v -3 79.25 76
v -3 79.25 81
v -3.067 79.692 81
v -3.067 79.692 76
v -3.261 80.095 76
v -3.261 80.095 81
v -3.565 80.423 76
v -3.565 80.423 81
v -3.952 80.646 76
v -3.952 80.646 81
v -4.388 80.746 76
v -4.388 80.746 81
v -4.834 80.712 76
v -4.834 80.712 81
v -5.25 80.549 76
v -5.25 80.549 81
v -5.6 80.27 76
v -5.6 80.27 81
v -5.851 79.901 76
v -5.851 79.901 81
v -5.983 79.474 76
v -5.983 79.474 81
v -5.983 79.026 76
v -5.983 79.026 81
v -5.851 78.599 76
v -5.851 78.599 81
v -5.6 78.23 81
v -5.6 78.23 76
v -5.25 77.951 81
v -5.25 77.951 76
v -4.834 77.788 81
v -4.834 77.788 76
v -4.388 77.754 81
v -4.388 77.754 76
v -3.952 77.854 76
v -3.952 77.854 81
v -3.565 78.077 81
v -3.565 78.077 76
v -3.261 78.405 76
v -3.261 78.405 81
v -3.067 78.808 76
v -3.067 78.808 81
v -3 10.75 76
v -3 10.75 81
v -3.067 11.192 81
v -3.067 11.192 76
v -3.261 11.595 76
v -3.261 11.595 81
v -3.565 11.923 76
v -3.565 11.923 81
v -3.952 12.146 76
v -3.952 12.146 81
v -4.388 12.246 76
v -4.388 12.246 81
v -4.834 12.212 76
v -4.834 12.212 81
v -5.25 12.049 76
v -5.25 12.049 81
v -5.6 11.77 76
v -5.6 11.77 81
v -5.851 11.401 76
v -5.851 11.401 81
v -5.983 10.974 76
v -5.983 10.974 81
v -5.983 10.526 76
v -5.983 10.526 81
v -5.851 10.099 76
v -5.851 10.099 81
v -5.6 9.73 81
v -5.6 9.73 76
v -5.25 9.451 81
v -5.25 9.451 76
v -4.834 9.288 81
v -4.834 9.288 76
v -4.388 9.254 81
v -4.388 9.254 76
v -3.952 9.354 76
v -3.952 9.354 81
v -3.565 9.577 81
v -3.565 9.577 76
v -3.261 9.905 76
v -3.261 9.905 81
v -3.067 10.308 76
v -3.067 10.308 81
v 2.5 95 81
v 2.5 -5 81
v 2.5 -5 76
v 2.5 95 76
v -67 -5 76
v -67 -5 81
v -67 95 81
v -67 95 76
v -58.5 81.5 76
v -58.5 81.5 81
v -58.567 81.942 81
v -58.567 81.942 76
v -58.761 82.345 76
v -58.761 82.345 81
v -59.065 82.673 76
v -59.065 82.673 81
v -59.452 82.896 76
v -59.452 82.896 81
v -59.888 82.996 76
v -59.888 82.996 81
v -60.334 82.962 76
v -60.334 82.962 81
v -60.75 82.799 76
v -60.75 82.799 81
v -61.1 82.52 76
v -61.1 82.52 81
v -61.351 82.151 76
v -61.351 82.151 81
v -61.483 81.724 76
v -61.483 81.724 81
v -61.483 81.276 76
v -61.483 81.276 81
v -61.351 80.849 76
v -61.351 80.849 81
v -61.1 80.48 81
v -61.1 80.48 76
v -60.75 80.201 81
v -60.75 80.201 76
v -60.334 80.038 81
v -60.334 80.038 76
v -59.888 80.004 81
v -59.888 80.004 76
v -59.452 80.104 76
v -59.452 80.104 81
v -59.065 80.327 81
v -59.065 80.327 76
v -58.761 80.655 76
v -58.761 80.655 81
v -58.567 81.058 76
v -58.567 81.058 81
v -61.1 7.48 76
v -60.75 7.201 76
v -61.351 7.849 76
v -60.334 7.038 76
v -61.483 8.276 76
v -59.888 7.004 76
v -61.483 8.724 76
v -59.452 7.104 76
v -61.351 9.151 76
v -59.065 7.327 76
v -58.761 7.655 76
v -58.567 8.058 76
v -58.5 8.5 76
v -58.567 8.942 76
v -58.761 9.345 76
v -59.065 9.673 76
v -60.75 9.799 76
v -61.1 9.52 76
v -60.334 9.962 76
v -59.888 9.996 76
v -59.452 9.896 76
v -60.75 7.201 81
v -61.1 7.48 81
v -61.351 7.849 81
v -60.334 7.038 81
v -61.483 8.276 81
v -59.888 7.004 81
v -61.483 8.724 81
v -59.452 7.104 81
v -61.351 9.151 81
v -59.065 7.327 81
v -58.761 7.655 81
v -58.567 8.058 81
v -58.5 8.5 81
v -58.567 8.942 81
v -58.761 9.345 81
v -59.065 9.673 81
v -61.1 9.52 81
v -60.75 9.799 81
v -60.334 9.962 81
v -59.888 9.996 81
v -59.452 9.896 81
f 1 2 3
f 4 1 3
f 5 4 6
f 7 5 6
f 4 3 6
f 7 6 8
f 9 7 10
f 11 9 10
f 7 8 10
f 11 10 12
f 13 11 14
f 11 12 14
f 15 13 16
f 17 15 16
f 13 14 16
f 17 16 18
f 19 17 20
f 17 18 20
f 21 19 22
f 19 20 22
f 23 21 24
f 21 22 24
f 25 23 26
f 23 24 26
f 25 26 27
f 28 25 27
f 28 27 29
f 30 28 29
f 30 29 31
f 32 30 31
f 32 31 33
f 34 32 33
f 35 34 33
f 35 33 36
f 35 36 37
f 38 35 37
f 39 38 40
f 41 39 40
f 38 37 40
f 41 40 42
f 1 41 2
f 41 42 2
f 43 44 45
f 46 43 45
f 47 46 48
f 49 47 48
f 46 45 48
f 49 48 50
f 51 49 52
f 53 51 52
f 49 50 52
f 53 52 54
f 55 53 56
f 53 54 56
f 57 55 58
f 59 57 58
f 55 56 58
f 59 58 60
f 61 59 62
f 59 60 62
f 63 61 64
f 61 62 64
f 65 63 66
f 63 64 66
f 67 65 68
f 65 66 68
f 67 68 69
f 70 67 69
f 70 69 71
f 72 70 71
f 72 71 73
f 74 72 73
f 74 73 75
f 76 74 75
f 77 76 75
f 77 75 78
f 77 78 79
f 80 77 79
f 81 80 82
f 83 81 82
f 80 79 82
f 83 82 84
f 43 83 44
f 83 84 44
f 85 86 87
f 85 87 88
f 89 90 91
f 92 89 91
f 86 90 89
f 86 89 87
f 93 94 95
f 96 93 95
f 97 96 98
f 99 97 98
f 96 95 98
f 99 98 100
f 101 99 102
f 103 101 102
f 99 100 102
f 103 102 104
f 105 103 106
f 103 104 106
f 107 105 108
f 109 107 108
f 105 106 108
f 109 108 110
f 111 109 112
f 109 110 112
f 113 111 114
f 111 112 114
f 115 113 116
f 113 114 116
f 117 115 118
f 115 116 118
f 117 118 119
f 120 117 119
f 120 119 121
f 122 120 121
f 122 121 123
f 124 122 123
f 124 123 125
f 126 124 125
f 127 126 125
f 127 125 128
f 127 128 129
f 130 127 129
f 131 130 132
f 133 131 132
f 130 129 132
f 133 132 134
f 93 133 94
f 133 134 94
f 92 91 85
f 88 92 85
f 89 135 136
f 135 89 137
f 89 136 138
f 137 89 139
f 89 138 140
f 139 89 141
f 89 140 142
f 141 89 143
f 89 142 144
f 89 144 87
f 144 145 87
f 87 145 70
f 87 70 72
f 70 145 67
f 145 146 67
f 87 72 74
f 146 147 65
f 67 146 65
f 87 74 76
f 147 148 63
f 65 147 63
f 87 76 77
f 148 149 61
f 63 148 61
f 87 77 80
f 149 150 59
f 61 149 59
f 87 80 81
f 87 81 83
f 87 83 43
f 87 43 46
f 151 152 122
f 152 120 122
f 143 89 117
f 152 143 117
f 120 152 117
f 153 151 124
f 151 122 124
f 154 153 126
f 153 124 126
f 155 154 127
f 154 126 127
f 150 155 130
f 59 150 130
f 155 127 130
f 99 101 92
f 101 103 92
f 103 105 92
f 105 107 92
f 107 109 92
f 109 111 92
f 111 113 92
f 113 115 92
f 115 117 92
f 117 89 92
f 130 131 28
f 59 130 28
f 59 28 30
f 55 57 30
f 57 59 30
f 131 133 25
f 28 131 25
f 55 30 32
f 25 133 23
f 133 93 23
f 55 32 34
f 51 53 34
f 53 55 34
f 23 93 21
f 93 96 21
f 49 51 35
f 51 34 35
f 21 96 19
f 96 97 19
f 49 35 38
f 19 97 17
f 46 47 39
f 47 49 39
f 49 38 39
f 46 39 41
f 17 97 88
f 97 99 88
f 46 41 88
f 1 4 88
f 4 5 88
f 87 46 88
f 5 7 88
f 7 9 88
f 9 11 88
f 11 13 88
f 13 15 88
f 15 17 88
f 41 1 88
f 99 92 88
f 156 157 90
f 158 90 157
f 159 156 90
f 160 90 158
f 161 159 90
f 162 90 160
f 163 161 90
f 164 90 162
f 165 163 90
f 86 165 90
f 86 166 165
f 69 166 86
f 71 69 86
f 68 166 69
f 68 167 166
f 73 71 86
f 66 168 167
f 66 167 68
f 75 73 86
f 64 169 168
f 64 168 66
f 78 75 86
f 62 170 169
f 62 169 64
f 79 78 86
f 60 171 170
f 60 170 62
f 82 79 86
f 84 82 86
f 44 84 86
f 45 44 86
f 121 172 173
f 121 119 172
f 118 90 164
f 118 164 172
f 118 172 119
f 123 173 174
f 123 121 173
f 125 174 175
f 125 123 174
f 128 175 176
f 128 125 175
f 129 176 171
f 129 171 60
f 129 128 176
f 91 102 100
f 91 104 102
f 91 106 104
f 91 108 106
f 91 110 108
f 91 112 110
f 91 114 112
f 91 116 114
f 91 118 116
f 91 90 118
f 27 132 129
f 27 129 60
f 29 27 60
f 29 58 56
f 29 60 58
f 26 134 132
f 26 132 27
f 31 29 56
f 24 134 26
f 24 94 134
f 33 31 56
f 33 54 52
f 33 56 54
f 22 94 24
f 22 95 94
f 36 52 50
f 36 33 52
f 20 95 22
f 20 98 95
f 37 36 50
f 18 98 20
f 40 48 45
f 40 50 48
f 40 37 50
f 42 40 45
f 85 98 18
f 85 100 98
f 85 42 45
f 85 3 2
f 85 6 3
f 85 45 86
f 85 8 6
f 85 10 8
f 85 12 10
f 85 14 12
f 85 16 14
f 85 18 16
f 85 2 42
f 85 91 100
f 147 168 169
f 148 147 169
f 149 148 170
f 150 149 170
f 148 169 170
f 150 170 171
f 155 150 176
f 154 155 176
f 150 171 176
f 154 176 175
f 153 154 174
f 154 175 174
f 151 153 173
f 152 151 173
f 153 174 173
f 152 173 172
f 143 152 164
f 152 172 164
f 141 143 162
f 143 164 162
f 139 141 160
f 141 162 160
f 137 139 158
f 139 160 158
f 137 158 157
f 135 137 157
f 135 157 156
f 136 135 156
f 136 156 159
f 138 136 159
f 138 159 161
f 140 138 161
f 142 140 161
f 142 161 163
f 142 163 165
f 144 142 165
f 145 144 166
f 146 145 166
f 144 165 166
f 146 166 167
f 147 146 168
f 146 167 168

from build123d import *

# Parameters (mm, degrees)
SKETCH_1_W      = 69.5
SKETCH_1_H      = 100
SKETCH_1_R      = 1.5
EXTRUDE_1_DEPTH = 5


with BuildPart() as part:
    # Эскиз1 → Бобышка-Вытянуть1 (new body)
    with BuildSketch(Plane.XY.offset(81)):
        with Locations((-32.25, 45)):
            Rectangle(SKETCH_1_W, SKETCH_1_H)
        with Locations((-60, 8.5)):
            Circle(SKETCH_1_R, mode=Mode.SUBTRACT)
        with Locations((-60, 81.5)):
            Circle(SKETCH_1_R, mode=Mode.SUBTRACT)
        with Locations((-4.5, 79.25)):
            Circle(SKETCH_1_R, mode=Mode.SUBTRACT)
        with Locations((-4.5, 10.75)):
            Circle(SKETCH_1_R, mode=Mode.SUBTRACT)
    extrude(amount=-EXTRUDE_1_DEPTH)


solid = part.part
